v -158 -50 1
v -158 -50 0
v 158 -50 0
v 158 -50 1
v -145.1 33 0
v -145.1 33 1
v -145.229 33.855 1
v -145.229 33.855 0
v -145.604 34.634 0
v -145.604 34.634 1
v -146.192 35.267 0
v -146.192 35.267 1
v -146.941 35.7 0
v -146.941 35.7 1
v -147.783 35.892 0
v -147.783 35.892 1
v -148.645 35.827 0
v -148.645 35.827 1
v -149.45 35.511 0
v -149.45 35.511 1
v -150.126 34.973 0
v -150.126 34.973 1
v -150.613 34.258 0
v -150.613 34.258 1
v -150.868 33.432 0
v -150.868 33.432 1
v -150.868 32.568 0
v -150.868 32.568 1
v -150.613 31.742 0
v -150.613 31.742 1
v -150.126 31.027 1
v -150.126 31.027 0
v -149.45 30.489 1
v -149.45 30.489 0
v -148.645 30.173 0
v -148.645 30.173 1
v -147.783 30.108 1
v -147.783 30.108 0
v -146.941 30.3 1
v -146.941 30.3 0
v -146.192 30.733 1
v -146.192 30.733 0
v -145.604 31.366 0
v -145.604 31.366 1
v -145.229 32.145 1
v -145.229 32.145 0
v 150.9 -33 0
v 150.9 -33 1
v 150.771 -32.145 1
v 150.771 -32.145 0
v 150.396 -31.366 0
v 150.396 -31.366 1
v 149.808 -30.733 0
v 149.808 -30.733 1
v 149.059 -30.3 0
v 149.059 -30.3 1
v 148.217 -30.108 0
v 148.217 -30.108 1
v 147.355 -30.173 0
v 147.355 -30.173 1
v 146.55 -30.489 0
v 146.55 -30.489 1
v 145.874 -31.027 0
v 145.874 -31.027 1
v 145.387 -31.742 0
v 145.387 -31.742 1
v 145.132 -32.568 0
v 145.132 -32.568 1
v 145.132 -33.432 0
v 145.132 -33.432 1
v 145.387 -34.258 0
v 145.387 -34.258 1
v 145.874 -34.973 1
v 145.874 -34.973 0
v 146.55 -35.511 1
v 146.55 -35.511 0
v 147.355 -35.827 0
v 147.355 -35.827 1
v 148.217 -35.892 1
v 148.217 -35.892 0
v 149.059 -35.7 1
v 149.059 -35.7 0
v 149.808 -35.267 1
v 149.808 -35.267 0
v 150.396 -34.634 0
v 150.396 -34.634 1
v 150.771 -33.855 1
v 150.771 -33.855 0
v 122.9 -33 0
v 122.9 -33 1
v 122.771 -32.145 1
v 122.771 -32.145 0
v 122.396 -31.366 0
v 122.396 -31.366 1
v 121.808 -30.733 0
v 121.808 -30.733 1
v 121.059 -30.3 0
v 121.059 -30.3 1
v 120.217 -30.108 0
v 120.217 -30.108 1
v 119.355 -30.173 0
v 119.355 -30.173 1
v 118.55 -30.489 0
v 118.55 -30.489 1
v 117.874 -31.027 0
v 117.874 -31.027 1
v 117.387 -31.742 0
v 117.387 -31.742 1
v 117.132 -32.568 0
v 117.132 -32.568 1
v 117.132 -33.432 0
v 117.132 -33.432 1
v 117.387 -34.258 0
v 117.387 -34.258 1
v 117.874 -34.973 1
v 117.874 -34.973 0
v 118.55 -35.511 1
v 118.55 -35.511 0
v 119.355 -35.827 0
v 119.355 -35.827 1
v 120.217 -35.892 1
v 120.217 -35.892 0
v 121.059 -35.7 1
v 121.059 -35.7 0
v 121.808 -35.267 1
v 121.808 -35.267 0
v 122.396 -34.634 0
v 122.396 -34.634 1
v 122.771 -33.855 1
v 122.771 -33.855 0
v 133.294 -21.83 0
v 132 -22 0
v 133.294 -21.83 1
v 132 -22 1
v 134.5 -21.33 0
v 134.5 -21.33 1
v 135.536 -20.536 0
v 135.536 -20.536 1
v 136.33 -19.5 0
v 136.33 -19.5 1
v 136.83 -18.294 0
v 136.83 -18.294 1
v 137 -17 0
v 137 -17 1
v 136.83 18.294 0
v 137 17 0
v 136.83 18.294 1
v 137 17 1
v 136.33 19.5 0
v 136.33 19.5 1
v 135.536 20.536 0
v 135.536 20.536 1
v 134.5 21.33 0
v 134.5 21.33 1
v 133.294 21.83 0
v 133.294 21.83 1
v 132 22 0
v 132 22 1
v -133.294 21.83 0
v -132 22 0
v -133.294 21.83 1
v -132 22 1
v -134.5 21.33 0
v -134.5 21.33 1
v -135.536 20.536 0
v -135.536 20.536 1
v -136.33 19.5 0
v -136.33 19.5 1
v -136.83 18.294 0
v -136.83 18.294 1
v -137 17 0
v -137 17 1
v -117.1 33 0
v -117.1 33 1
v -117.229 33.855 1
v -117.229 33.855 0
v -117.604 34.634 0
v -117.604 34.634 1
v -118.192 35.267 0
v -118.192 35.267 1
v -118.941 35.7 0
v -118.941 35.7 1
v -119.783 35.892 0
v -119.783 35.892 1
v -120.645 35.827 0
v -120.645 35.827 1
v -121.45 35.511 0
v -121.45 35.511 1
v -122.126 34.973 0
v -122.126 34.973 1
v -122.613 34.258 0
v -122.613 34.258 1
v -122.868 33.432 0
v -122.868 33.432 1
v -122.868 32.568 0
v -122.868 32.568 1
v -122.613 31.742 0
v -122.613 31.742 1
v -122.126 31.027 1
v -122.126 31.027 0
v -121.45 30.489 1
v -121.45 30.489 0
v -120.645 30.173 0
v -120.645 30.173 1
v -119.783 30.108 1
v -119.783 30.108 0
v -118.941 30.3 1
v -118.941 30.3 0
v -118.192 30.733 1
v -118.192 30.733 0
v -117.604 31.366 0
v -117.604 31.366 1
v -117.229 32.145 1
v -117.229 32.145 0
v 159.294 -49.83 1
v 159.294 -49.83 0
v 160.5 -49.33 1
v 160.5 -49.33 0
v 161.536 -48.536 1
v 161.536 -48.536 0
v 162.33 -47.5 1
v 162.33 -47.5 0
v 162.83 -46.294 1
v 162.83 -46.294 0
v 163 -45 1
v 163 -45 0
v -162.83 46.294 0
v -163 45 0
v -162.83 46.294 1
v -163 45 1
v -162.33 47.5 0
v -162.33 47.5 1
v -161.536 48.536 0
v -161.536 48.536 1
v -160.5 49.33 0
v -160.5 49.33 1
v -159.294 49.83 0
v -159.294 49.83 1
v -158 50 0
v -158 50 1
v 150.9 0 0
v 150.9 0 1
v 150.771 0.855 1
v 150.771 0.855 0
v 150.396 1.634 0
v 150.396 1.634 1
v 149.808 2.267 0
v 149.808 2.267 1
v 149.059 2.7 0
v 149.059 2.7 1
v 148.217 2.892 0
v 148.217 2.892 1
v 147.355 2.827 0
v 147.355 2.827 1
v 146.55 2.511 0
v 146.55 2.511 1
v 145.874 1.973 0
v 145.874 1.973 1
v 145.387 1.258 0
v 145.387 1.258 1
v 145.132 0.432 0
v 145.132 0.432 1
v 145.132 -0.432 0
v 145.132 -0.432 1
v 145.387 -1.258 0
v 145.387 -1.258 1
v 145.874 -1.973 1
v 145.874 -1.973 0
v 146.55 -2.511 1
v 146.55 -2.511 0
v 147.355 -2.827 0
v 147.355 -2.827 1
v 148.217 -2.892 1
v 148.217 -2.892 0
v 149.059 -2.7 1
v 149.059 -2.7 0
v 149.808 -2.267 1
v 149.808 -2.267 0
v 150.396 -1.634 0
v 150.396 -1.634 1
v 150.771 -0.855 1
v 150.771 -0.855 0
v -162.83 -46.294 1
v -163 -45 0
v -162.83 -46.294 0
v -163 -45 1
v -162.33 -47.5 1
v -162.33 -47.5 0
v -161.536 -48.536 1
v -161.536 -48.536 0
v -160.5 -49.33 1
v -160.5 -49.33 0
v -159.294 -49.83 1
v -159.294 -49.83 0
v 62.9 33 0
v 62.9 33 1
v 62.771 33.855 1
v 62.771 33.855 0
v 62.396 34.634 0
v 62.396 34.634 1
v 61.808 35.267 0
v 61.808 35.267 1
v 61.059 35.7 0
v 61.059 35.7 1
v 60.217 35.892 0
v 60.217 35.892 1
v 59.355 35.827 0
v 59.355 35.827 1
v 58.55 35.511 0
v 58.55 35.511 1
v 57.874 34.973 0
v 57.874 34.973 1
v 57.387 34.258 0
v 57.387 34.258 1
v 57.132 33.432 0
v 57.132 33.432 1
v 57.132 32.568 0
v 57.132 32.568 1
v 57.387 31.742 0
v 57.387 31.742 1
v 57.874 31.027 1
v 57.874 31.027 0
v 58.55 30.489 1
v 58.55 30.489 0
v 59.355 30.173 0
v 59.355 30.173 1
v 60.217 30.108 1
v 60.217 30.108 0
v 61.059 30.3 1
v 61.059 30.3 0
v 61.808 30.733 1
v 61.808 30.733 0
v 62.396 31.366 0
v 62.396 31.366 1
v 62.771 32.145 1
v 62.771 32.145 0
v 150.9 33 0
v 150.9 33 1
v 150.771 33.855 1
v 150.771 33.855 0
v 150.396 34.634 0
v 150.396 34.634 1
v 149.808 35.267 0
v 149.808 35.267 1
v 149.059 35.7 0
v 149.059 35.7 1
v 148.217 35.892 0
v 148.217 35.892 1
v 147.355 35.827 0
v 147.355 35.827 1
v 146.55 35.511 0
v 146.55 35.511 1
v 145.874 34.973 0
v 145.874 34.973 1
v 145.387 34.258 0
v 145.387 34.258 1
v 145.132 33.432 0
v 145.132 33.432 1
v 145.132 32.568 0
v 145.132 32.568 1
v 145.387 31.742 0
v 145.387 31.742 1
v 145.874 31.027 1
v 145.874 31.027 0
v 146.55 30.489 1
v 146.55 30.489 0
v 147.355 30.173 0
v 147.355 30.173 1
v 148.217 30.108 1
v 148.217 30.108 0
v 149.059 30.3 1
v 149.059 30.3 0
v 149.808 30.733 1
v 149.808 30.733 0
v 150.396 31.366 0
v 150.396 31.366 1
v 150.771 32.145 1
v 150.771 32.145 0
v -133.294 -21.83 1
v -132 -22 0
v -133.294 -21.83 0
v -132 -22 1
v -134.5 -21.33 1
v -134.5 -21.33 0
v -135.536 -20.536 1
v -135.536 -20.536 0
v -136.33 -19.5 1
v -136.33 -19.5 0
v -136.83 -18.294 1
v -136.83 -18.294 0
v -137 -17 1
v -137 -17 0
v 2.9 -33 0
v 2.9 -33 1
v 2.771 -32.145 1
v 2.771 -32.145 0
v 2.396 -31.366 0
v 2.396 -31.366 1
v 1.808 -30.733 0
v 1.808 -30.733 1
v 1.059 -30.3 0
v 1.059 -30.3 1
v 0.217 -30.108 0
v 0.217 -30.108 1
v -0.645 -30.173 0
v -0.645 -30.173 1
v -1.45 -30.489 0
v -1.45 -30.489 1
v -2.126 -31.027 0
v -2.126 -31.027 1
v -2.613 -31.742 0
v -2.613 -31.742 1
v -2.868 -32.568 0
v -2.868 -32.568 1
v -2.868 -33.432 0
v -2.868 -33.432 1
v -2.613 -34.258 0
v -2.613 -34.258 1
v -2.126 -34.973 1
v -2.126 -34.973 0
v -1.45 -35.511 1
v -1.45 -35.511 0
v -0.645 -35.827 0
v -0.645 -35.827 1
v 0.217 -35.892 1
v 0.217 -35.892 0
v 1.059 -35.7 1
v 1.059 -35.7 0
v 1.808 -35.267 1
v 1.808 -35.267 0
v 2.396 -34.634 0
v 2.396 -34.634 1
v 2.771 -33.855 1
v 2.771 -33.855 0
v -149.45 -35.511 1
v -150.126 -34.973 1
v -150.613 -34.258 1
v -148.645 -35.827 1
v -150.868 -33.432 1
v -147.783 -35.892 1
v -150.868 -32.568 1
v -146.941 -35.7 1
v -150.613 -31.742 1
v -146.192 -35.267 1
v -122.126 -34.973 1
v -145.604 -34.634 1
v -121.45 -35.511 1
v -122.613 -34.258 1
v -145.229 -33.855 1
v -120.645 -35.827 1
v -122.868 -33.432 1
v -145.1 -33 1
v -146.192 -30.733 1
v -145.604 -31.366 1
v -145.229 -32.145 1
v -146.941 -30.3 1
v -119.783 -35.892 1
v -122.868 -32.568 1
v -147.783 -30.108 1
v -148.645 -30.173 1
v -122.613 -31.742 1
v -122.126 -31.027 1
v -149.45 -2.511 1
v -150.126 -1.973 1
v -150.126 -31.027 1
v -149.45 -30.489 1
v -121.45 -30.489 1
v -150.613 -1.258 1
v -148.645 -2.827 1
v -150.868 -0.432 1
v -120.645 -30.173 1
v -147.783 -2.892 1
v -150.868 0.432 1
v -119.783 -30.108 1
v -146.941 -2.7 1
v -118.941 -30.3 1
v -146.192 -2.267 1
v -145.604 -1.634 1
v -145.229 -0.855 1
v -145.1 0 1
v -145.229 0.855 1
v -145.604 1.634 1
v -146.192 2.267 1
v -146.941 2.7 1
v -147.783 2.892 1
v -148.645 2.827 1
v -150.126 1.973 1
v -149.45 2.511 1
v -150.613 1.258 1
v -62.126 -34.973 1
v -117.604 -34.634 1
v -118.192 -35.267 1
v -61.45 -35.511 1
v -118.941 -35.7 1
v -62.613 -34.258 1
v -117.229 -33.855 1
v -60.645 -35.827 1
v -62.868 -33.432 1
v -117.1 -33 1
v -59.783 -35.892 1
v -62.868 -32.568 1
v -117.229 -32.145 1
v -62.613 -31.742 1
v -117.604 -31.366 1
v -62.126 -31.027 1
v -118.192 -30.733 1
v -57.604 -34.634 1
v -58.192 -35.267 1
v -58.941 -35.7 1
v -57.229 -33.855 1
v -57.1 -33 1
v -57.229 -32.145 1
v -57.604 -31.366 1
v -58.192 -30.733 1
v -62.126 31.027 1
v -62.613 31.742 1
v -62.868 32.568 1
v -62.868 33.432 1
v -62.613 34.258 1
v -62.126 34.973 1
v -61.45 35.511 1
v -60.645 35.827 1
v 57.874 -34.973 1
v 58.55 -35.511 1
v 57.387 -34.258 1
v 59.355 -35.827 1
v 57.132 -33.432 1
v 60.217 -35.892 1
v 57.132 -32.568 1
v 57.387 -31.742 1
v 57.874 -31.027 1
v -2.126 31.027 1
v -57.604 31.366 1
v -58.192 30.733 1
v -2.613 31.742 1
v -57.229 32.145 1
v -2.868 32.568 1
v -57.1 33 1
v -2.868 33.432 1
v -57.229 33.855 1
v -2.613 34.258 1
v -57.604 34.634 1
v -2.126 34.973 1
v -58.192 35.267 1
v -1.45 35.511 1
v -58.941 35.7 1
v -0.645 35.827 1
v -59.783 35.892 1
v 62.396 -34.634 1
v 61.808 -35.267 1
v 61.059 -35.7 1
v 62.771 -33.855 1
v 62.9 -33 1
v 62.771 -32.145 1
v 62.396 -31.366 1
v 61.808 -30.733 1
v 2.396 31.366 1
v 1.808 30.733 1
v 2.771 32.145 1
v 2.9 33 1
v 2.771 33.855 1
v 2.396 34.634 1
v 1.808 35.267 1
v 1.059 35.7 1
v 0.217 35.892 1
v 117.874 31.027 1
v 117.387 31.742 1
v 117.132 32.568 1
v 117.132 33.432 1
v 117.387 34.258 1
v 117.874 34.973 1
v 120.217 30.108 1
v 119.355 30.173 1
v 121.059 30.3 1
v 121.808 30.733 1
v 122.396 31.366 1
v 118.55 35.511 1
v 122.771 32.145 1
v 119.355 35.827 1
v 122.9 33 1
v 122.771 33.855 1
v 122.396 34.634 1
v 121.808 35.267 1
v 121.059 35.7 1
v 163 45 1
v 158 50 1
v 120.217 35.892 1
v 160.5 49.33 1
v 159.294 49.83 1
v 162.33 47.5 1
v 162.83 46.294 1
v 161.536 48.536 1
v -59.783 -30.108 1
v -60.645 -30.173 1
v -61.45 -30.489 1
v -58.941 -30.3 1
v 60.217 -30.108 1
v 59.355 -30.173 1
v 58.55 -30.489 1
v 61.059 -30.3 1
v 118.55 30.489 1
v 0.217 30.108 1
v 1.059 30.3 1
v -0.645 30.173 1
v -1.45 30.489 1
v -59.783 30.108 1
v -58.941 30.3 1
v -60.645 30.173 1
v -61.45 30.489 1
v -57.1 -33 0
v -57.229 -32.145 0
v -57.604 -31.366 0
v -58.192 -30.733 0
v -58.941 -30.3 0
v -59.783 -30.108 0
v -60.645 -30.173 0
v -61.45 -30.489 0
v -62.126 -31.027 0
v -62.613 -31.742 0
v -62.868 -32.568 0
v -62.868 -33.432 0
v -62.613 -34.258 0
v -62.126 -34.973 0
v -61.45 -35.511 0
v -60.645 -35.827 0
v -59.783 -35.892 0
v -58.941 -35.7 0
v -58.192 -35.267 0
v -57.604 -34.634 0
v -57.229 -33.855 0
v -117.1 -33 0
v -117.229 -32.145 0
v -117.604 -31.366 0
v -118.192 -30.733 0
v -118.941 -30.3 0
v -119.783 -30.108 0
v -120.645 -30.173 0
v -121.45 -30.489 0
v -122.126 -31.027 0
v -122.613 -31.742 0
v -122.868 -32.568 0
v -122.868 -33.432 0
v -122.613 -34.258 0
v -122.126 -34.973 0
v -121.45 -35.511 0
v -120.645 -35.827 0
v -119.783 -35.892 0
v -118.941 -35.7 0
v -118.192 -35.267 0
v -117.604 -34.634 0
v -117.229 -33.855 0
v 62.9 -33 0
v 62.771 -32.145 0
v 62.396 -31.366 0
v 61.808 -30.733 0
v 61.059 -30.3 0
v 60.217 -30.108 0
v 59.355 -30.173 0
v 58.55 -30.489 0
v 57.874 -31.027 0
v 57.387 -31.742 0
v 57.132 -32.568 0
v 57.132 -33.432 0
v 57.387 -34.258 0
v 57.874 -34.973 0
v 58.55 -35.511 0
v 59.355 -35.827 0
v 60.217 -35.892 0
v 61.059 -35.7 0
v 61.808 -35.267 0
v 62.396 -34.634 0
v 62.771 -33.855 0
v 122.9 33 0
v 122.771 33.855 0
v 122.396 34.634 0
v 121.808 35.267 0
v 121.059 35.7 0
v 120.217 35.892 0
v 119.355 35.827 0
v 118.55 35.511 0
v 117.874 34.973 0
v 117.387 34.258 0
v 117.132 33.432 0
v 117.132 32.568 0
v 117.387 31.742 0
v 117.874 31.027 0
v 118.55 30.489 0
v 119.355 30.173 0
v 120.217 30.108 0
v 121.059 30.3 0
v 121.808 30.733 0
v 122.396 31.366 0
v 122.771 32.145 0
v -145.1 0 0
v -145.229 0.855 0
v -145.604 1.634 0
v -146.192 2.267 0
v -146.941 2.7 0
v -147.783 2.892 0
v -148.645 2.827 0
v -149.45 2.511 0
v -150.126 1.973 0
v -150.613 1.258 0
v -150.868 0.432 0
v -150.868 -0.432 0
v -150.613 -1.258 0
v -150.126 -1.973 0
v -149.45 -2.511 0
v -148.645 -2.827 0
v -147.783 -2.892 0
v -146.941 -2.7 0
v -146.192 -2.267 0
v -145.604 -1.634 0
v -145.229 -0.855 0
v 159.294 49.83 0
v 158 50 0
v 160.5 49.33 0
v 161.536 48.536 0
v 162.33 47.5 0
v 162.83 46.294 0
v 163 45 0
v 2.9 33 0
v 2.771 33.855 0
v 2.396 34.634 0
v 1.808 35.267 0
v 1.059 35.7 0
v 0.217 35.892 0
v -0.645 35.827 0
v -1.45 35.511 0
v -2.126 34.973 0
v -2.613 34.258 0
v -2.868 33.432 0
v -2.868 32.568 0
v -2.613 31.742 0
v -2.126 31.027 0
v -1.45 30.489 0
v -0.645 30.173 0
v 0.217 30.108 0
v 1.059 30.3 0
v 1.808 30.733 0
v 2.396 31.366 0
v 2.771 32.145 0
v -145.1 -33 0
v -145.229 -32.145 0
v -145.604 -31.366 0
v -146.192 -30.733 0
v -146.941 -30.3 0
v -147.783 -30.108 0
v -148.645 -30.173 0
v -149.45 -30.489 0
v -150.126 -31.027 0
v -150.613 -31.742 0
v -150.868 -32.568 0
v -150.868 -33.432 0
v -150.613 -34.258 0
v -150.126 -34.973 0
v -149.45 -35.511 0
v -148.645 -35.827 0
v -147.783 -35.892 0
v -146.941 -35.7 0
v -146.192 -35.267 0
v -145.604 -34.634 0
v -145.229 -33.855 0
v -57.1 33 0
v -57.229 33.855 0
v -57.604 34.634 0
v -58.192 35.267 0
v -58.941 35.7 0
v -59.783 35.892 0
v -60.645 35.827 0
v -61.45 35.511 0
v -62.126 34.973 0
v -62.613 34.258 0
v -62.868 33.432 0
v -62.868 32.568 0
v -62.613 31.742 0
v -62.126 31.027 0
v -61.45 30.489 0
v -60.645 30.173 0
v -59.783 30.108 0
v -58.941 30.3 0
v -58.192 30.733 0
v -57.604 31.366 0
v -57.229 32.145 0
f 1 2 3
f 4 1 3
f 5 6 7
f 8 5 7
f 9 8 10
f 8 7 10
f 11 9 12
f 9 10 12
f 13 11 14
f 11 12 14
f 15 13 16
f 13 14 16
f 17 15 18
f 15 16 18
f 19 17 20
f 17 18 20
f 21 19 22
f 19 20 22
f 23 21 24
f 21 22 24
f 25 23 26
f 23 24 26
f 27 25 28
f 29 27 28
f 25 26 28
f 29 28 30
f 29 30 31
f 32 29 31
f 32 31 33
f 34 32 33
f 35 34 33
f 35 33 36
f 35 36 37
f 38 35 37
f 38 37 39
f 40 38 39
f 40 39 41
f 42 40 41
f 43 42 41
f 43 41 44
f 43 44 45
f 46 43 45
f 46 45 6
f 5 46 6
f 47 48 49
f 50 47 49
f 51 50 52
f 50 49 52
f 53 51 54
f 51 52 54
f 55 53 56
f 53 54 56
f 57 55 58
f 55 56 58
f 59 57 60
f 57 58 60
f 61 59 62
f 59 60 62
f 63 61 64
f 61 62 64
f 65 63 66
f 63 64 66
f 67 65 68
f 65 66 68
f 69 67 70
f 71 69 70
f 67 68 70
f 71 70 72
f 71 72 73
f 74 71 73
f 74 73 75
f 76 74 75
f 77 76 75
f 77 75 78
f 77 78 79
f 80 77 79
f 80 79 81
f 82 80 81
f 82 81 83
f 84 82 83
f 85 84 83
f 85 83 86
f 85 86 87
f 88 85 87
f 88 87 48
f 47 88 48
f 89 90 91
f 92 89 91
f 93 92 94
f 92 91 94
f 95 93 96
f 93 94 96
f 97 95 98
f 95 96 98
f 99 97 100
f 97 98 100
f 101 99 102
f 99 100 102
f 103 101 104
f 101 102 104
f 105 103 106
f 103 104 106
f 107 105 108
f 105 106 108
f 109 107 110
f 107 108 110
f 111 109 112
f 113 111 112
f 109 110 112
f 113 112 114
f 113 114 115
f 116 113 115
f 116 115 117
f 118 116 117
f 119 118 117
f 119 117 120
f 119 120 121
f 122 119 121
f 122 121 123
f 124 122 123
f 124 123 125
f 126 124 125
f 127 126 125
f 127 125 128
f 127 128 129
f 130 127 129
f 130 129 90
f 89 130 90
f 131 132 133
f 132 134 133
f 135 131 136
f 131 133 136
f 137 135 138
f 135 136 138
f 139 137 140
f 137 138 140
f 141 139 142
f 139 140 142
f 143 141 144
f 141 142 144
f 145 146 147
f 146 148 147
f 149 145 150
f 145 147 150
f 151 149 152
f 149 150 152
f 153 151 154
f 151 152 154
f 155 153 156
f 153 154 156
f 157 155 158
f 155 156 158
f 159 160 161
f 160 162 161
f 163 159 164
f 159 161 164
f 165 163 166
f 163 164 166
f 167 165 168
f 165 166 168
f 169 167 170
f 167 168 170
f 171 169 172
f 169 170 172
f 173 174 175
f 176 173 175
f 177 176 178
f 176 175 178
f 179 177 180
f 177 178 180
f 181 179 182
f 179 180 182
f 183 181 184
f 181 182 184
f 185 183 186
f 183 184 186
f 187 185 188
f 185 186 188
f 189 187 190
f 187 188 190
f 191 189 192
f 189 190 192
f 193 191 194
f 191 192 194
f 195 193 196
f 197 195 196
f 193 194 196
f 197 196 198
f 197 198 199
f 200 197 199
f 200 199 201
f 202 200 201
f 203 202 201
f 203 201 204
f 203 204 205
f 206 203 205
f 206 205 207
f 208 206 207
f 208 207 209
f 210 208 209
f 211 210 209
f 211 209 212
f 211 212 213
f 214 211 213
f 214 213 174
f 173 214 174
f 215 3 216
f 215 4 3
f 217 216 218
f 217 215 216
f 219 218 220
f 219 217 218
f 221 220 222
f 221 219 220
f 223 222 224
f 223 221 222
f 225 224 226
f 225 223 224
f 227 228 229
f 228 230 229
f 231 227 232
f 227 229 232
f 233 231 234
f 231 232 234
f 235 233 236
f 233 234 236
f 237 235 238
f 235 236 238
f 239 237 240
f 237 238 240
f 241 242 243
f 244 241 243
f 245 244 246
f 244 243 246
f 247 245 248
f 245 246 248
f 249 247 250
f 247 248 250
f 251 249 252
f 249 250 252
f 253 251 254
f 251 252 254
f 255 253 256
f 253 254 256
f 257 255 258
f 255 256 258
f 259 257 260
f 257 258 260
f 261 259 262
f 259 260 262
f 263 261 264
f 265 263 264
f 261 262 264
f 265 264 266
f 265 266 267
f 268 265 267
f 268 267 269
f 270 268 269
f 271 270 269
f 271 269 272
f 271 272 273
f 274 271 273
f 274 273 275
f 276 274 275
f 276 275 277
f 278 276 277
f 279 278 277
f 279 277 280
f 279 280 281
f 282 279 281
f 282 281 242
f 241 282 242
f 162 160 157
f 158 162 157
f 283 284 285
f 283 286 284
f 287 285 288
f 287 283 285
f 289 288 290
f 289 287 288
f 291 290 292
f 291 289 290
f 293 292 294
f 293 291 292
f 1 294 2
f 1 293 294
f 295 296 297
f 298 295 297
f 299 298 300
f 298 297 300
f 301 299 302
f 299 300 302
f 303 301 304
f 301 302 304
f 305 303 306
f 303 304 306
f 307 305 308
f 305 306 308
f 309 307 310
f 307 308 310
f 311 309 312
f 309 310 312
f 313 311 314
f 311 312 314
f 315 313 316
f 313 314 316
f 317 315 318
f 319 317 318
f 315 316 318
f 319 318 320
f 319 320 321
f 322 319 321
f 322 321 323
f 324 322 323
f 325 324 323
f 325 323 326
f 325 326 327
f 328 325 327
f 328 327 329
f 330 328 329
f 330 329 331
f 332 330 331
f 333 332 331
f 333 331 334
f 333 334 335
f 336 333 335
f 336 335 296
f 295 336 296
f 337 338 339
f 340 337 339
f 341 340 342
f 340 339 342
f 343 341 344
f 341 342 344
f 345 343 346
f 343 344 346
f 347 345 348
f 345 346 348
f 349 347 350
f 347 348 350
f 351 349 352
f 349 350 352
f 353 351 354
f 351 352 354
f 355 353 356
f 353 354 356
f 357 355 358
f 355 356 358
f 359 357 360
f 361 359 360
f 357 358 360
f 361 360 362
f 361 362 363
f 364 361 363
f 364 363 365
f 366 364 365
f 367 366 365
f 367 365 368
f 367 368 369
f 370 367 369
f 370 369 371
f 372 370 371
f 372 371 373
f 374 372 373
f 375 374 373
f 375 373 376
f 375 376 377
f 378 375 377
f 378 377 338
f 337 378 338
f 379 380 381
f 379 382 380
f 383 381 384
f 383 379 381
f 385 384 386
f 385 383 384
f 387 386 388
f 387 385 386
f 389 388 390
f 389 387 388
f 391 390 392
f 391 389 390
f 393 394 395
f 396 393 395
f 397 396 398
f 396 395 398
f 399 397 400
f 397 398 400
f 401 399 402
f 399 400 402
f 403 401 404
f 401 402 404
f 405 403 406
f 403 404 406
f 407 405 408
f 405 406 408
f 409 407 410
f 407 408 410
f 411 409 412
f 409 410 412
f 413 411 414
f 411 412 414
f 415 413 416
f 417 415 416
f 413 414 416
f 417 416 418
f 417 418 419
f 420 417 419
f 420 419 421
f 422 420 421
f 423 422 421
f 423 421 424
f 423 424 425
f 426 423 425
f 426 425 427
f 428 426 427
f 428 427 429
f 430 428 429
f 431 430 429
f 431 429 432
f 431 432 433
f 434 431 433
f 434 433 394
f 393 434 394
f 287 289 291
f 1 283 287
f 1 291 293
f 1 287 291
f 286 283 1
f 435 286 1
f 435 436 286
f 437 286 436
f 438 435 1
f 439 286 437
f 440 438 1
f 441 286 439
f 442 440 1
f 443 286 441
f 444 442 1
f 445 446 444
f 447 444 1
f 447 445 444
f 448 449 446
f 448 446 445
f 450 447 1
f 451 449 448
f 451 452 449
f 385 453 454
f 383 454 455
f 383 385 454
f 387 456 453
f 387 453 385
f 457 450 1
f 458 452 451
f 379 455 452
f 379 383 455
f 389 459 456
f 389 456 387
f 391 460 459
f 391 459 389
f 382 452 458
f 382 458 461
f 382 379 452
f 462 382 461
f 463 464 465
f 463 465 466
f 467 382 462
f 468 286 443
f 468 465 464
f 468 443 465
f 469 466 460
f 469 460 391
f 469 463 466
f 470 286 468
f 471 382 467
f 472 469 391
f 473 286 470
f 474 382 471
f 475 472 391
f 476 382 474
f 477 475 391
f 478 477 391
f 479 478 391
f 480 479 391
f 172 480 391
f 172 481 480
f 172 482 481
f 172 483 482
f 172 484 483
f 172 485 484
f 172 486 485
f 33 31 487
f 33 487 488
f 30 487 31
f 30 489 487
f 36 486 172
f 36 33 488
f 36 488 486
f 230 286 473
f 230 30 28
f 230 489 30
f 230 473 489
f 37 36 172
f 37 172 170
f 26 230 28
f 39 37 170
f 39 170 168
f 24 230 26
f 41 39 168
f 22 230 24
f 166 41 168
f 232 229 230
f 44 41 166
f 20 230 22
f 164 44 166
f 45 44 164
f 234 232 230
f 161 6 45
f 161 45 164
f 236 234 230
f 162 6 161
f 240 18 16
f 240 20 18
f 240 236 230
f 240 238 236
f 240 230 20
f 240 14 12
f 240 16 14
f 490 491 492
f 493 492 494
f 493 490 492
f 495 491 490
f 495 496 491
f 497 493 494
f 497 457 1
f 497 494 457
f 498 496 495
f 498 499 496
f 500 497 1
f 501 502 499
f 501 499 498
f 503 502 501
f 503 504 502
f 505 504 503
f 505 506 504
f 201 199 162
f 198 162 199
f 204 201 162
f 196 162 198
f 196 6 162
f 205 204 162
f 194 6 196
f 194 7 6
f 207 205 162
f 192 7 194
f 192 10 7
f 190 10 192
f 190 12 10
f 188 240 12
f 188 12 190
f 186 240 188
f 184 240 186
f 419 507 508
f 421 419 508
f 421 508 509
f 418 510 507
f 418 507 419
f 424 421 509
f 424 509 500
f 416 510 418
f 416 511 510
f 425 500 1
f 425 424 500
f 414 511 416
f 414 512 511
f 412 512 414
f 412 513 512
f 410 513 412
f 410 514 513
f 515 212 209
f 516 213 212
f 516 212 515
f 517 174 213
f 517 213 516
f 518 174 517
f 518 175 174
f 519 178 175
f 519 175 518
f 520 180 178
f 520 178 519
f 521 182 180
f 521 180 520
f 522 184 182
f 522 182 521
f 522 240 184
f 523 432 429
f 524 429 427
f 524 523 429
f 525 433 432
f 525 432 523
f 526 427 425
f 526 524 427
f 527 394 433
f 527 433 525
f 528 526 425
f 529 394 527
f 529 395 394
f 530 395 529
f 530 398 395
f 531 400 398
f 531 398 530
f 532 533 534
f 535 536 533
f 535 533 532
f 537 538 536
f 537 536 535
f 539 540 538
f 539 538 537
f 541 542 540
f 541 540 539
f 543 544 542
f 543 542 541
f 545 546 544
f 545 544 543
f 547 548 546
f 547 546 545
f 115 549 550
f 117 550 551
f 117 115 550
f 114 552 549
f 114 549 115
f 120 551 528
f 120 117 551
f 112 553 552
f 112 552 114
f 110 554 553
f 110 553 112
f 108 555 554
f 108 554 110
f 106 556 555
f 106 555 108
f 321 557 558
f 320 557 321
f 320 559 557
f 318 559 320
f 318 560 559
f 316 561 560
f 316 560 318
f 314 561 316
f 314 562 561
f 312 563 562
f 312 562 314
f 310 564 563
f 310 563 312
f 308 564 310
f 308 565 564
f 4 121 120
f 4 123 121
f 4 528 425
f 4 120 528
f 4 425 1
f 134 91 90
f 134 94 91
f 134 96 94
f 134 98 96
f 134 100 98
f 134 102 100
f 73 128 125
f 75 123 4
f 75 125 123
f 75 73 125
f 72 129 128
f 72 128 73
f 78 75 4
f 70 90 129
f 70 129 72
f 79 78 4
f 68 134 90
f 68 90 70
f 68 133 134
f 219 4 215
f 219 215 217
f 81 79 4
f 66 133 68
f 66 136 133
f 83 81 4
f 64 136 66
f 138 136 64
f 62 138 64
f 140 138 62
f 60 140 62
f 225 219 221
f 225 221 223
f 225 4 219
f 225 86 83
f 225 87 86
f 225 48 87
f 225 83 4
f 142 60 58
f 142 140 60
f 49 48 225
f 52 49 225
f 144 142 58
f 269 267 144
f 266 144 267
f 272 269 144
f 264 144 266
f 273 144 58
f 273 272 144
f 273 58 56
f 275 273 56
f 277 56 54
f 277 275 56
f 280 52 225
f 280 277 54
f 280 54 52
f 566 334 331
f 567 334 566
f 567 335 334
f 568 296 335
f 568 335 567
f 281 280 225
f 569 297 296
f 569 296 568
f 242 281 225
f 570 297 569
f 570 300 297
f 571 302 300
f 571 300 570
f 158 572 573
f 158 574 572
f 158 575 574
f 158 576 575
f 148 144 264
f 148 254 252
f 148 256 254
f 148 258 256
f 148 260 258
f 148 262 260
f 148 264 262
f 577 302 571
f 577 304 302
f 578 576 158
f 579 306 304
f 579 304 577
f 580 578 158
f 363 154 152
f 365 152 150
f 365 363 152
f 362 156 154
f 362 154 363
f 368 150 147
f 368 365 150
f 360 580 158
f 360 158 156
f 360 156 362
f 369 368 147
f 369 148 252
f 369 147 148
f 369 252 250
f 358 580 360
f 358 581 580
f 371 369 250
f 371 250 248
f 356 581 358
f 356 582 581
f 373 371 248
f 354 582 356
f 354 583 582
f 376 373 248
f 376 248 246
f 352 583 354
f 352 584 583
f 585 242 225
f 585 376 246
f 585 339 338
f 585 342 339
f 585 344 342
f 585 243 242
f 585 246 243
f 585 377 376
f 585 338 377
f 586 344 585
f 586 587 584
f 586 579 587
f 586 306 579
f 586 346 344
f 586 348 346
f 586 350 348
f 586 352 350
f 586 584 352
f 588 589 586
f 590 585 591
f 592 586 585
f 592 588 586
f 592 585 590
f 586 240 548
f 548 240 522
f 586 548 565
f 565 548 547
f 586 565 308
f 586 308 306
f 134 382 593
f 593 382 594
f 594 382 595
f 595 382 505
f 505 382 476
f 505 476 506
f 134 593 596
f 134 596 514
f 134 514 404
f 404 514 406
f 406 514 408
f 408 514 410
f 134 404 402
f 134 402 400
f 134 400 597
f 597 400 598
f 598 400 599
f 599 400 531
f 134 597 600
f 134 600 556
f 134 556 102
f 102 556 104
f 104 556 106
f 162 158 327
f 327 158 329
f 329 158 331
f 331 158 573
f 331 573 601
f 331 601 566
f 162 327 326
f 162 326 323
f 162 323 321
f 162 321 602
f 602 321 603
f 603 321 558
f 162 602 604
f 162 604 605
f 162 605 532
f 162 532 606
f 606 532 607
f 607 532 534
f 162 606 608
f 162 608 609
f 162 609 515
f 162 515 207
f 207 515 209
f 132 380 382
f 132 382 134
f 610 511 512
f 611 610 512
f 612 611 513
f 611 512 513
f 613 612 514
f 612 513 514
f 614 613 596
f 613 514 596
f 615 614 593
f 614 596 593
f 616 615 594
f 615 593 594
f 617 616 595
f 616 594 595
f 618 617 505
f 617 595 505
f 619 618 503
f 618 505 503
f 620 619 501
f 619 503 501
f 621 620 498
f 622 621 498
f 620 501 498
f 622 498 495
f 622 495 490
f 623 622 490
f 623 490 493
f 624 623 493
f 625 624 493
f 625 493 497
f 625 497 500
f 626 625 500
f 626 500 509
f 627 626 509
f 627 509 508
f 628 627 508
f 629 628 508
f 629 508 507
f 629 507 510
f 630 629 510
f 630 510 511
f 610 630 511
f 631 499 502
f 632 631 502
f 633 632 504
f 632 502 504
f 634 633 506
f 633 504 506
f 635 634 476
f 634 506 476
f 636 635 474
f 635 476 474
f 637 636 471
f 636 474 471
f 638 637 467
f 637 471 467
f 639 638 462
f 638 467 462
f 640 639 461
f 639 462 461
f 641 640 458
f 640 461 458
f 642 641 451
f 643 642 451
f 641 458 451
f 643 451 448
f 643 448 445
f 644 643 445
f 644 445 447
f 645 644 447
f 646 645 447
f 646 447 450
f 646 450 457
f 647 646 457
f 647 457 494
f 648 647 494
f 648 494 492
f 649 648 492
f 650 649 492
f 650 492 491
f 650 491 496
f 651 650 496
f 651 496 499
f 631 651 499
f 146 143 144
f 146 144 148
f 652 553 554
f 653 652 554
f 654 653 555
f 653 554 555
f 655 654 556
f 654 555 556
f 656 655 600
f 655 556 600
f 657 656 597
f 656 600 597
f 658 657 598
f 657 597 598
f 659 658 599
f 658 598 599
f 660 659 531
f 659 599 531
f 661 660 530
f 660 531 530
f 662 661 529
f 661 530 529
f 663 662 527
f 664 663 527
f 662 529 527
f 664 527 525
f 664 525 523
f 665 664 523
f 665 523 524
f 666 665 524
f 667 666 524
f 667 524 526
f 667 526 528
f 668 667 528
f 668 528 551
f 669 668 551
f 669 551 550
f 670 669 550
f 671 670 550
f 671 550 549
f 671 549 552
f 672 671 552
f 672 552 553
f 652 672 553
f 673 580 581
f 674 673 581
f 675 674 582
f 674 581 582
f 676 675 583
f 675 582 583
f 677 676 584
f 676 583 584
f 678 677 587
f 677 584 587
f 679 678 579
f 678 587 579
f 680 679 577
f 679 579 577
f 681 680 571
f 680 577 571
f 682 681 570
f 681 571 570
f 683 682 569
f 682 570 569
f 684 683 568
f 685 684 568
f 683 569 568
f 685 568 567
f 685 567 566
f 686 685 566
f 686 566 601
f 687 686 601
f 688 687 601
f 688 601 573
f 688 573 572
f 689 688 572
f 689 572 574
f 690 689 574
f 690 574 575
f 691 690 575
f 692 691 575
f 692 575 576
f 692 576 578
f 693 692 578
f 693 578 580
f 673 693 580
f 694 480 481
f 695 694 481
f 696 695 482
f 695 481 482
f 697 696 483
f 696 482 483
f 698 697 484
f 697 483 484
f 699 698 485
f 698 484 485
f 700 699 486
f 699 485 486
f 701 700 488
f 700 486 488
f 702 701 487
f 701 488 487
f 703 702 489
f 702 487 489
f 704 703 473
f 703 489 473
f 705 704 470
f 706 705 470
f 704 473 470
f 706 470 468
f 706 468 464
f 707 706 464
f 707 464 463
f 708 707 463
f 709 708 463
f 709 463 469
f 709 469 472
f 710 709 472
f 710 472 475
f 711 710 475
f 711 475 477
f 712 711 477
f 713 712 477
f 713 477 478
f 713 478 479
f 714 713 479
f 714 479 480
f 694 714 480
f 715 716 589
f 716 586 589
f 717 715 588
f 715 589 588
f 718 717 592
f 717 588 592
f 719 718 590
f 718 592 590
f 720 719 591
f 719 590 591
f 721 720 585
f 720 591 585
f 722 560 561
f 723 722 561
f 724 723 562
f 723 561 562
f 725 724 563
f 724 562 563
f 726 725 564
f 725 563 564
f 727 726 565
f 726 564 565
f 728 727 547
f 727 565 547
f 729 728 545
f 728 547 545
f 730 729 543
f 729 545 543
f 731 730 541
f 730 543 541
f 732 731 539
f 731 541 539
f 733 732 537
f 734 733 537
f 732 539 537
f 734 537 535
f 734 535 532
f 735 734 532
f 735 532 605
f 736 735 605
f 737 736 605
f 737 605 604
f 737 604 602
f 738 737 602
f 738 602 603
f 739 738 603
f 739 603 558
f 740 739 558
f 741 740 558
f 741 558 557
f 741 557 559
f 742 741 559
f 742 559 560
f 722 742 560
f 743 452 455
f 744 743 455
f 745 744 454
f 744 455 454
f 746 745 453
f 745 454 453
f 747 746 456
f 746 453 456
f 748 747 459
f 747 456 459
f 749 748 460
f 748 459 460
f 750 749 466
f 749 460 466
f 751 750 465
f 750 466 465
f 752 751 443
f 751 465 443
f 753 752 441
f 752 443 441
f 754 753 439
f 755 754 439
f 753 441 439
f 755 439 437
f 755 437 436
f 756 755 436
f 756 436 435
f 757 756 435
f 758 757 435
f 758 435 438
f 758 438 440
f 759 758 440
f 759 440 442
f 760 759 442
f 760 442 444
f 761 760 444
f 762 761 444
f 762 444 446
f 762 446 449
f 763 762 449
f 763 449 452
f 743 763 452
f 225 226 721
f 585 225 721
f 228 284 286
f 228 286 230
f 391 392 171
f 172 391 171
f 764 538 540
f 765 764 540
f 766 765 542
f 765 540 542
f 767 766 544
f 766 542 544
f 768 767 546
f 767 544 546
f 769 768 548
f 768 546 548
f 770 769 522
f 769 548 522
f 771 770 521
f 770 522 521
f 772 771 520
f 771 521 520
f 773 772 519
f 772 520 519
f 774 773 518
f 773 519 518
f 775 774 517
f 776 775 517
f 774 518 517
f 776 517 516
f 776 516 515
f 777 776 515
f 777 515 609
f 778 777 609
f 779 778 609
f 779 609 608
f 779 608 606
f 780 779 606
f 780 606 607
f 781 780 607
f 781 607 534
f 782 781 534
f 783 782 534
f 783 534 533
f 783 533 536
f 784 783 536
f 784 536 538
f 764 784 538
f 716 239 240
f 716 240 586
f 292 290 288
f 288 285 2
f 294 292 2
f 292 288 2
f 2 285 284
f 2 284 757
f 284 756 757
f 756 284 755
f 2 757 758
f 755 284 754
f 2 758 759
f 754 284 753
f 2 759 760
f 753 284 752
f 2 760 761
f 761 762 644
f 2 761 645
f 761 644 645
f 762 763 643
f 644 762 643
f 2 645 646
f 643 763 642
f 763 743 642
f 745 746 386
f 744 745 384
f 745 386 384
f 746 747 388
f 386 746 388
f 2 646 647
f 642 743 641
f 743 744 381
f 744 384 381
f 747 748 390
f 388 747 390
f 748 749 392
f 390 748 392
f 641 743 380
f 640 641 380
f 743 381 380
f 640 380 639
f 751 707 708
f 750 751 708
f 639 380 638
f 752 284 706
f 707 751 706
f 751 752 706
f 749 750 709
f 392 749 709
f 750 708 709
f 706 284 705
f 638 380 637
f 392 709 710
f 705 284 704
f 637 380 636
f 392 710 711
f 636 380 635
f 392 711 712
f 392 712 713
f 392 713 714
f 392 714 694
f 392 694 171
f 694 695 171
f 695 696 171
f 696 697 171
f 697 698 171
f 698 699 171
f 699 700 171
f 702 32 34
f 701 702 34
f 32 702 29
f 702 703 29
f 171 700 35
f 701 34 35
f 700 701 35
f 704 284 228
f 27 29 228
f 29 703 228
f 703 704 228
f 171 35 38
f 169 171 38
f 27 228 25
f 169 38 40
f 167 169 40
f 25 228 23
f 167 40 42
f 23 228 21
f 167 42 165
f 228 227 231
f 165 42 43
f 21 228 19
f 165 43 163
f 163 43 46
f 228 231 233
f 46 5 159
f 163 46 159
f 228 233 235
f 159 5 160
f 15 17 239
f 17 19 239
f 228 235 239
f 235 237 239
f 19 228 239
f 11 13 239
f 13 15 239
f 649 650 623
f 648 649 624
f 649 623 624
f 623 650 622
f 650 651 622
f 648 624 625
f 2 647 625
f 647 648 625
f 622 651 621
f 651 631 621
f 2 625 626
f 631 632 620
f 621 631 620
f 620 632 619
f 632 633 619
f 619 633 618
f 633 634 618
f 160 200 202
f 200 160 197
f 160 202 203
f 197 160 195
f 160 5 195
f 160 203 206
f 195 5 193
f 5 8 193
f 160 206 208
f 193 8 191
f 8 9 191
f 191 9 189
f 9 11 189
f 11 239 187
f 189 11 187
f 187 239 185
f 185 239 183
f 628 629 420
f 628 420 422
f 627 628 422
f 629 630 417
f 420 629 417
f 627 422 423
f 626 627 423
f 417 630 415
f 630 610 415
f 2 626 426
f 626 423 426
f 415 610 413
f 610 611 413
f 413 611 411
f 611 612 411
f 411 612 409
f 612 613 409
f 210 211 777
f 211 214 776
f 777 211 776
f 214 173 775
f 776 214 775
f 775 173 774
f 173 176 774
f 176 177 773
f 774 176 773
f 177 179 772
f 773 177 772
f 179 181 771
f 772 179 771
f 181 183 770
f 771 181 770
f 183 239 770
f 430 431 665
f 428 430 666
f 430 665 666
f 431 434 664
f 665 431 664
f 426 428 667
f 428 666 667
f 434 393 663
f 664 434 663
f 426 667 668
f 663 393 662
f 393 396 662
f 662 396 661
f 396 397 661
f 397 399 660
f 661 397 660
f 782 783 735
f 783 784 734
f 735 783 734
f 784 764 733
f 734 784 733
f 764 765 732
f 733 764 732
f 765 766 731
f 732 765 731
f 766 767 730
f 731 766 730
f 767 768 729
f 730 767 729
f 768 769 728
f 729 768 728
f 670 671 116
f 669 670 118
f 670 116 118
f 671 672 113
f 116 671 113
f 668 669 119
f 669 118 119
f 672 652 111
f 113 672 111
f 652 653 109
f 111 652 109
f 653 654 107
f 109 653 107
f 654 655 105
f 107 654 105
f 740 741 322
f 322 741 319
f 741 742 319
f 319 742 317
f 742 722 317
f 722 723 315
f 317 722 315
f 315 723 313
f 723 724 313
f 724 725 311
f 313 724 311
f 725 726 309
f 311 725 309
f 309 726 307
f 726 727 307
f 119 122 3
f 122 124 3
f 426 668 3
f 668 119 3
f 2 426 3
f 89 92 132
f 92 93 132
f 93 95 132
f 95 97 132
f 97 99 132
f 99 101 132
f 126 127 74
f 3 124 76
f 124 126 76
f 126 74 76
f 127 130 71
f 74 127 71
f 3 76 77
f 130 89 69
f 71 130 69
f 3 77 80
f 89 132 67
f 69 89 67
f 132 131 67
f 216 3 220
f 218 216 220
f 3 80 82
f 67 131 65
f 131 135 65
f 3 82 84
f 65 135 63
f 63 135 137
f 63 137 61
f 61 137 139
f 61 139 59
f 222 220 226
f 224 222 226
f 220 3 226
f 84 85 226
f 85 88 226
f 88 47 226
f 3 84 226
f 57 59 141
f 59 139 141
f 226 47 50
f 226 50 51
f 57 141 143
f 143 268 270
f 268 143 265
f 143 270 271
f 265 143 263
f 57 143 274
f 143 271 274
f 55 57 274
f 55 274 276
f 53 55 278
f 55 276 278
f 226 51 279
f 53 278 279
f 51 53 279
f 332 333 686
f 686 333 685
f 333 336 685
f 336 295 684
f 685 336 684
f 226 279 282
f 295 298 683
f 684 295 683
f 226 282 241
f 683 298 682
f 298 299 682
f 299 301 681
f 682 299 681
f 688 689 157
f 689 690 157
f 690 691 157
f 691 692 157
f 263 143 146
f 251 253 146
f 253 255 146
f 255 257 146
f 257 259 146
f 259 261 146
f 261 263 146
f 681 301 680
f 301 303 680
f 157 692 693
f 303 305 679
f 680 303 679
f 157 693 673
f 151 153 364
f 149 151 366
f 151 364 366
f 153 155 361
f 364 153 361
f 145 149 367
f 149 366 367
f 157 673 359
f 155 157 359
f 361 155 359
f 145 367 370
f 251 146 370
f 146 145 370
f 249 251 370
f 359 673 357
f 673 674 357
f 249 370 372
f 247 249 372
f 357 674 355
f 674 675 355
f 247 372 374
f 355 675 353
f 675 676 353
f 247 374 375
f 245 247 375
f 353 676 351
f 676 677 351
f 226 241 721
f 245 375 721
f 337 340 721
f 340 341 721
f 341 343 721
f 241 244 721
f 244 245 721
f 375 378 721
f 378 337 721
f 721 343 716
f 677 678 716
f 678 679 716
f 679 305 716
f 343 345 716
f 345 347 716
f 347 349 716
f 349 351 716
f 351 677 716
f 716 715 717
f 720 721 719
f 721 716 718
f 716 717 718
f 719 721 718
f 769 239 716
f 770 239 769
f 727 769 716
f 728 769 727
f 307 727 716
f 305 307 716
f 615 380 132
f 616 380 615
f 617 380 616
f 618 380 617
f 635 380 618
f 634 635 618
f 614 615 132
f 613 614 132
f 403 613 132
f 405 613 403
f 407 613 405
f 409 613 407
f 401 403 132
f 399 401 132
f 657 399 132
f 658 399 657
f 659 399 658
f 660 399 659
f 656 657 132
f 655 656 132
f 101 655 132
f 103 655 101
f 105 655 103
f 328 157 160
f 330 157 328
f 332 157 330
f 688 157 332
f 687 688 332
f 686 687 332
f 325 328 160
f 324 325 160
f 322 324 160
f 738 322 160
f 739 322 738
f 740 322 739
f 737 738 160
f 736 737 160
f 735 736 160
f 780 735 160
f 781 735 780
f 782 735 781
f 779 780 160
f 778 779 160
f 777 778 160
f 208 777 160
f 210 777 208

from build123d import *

# Parameters (mm, degrees)
SKETCH1_W            = 326
SKETCH1_H            = 100
SKETCH1_W_2          = 274
SKETCH1_H_2          = 44
BOSS_EXTRUDE1_DEPTH  = 1
FILLET1_R            = 5
M5_CLEARANCE_HOLE1_D = 5.8


with BuildPart() as part:
    # Sketch1 → Boss-Extrude1 (new body)
    with BuildSketch(Plane.XY):
        Rectangle(SKETCH1_W, SKETCH1_H)
        Rectangle(SKETCH1_W_2, SKETCH1_H_2, mode=Mode.SUBTRACT)
    extrude(amount=BOSS_EXTRUDE1_DEPTH)

    # Fillet1
    fillet1_edges = [part.edges().sort_by_distance(p)[0] for p in [
        (-137, 22, 0.5),
        (-137, -22, 0.5),
        (137, -22, 0.5),
        (137, 22, 0.5),
        (163, -50, 0.5),
        (-163, -50, 0.5),
        (-163, 50, 0.5),
        (163, 50, 0.5),
    ]]
    fillet(fillet1_edges, radius=FILLET1_R)

    # M5 Clearance Hole1 (through all)
    with Locations(Plane(origin=(0, 0, 0), x_dir=(-1, 0, 0), z_dir=(0, 0, -1))):
        with Locations((0, 33), (60, 33), (120, 33), (148, 33), (148, 0), (148, -33), (120, -33), (60, -33), (0, -33), (-60, 33), (-60, -33), (-120, -33), (-148, -33), (-148, 0), (-148, 33), (-120, 33)):
            Hole(M5_CLEARANCE_HOLE1_D / 2)


solid = part.part
